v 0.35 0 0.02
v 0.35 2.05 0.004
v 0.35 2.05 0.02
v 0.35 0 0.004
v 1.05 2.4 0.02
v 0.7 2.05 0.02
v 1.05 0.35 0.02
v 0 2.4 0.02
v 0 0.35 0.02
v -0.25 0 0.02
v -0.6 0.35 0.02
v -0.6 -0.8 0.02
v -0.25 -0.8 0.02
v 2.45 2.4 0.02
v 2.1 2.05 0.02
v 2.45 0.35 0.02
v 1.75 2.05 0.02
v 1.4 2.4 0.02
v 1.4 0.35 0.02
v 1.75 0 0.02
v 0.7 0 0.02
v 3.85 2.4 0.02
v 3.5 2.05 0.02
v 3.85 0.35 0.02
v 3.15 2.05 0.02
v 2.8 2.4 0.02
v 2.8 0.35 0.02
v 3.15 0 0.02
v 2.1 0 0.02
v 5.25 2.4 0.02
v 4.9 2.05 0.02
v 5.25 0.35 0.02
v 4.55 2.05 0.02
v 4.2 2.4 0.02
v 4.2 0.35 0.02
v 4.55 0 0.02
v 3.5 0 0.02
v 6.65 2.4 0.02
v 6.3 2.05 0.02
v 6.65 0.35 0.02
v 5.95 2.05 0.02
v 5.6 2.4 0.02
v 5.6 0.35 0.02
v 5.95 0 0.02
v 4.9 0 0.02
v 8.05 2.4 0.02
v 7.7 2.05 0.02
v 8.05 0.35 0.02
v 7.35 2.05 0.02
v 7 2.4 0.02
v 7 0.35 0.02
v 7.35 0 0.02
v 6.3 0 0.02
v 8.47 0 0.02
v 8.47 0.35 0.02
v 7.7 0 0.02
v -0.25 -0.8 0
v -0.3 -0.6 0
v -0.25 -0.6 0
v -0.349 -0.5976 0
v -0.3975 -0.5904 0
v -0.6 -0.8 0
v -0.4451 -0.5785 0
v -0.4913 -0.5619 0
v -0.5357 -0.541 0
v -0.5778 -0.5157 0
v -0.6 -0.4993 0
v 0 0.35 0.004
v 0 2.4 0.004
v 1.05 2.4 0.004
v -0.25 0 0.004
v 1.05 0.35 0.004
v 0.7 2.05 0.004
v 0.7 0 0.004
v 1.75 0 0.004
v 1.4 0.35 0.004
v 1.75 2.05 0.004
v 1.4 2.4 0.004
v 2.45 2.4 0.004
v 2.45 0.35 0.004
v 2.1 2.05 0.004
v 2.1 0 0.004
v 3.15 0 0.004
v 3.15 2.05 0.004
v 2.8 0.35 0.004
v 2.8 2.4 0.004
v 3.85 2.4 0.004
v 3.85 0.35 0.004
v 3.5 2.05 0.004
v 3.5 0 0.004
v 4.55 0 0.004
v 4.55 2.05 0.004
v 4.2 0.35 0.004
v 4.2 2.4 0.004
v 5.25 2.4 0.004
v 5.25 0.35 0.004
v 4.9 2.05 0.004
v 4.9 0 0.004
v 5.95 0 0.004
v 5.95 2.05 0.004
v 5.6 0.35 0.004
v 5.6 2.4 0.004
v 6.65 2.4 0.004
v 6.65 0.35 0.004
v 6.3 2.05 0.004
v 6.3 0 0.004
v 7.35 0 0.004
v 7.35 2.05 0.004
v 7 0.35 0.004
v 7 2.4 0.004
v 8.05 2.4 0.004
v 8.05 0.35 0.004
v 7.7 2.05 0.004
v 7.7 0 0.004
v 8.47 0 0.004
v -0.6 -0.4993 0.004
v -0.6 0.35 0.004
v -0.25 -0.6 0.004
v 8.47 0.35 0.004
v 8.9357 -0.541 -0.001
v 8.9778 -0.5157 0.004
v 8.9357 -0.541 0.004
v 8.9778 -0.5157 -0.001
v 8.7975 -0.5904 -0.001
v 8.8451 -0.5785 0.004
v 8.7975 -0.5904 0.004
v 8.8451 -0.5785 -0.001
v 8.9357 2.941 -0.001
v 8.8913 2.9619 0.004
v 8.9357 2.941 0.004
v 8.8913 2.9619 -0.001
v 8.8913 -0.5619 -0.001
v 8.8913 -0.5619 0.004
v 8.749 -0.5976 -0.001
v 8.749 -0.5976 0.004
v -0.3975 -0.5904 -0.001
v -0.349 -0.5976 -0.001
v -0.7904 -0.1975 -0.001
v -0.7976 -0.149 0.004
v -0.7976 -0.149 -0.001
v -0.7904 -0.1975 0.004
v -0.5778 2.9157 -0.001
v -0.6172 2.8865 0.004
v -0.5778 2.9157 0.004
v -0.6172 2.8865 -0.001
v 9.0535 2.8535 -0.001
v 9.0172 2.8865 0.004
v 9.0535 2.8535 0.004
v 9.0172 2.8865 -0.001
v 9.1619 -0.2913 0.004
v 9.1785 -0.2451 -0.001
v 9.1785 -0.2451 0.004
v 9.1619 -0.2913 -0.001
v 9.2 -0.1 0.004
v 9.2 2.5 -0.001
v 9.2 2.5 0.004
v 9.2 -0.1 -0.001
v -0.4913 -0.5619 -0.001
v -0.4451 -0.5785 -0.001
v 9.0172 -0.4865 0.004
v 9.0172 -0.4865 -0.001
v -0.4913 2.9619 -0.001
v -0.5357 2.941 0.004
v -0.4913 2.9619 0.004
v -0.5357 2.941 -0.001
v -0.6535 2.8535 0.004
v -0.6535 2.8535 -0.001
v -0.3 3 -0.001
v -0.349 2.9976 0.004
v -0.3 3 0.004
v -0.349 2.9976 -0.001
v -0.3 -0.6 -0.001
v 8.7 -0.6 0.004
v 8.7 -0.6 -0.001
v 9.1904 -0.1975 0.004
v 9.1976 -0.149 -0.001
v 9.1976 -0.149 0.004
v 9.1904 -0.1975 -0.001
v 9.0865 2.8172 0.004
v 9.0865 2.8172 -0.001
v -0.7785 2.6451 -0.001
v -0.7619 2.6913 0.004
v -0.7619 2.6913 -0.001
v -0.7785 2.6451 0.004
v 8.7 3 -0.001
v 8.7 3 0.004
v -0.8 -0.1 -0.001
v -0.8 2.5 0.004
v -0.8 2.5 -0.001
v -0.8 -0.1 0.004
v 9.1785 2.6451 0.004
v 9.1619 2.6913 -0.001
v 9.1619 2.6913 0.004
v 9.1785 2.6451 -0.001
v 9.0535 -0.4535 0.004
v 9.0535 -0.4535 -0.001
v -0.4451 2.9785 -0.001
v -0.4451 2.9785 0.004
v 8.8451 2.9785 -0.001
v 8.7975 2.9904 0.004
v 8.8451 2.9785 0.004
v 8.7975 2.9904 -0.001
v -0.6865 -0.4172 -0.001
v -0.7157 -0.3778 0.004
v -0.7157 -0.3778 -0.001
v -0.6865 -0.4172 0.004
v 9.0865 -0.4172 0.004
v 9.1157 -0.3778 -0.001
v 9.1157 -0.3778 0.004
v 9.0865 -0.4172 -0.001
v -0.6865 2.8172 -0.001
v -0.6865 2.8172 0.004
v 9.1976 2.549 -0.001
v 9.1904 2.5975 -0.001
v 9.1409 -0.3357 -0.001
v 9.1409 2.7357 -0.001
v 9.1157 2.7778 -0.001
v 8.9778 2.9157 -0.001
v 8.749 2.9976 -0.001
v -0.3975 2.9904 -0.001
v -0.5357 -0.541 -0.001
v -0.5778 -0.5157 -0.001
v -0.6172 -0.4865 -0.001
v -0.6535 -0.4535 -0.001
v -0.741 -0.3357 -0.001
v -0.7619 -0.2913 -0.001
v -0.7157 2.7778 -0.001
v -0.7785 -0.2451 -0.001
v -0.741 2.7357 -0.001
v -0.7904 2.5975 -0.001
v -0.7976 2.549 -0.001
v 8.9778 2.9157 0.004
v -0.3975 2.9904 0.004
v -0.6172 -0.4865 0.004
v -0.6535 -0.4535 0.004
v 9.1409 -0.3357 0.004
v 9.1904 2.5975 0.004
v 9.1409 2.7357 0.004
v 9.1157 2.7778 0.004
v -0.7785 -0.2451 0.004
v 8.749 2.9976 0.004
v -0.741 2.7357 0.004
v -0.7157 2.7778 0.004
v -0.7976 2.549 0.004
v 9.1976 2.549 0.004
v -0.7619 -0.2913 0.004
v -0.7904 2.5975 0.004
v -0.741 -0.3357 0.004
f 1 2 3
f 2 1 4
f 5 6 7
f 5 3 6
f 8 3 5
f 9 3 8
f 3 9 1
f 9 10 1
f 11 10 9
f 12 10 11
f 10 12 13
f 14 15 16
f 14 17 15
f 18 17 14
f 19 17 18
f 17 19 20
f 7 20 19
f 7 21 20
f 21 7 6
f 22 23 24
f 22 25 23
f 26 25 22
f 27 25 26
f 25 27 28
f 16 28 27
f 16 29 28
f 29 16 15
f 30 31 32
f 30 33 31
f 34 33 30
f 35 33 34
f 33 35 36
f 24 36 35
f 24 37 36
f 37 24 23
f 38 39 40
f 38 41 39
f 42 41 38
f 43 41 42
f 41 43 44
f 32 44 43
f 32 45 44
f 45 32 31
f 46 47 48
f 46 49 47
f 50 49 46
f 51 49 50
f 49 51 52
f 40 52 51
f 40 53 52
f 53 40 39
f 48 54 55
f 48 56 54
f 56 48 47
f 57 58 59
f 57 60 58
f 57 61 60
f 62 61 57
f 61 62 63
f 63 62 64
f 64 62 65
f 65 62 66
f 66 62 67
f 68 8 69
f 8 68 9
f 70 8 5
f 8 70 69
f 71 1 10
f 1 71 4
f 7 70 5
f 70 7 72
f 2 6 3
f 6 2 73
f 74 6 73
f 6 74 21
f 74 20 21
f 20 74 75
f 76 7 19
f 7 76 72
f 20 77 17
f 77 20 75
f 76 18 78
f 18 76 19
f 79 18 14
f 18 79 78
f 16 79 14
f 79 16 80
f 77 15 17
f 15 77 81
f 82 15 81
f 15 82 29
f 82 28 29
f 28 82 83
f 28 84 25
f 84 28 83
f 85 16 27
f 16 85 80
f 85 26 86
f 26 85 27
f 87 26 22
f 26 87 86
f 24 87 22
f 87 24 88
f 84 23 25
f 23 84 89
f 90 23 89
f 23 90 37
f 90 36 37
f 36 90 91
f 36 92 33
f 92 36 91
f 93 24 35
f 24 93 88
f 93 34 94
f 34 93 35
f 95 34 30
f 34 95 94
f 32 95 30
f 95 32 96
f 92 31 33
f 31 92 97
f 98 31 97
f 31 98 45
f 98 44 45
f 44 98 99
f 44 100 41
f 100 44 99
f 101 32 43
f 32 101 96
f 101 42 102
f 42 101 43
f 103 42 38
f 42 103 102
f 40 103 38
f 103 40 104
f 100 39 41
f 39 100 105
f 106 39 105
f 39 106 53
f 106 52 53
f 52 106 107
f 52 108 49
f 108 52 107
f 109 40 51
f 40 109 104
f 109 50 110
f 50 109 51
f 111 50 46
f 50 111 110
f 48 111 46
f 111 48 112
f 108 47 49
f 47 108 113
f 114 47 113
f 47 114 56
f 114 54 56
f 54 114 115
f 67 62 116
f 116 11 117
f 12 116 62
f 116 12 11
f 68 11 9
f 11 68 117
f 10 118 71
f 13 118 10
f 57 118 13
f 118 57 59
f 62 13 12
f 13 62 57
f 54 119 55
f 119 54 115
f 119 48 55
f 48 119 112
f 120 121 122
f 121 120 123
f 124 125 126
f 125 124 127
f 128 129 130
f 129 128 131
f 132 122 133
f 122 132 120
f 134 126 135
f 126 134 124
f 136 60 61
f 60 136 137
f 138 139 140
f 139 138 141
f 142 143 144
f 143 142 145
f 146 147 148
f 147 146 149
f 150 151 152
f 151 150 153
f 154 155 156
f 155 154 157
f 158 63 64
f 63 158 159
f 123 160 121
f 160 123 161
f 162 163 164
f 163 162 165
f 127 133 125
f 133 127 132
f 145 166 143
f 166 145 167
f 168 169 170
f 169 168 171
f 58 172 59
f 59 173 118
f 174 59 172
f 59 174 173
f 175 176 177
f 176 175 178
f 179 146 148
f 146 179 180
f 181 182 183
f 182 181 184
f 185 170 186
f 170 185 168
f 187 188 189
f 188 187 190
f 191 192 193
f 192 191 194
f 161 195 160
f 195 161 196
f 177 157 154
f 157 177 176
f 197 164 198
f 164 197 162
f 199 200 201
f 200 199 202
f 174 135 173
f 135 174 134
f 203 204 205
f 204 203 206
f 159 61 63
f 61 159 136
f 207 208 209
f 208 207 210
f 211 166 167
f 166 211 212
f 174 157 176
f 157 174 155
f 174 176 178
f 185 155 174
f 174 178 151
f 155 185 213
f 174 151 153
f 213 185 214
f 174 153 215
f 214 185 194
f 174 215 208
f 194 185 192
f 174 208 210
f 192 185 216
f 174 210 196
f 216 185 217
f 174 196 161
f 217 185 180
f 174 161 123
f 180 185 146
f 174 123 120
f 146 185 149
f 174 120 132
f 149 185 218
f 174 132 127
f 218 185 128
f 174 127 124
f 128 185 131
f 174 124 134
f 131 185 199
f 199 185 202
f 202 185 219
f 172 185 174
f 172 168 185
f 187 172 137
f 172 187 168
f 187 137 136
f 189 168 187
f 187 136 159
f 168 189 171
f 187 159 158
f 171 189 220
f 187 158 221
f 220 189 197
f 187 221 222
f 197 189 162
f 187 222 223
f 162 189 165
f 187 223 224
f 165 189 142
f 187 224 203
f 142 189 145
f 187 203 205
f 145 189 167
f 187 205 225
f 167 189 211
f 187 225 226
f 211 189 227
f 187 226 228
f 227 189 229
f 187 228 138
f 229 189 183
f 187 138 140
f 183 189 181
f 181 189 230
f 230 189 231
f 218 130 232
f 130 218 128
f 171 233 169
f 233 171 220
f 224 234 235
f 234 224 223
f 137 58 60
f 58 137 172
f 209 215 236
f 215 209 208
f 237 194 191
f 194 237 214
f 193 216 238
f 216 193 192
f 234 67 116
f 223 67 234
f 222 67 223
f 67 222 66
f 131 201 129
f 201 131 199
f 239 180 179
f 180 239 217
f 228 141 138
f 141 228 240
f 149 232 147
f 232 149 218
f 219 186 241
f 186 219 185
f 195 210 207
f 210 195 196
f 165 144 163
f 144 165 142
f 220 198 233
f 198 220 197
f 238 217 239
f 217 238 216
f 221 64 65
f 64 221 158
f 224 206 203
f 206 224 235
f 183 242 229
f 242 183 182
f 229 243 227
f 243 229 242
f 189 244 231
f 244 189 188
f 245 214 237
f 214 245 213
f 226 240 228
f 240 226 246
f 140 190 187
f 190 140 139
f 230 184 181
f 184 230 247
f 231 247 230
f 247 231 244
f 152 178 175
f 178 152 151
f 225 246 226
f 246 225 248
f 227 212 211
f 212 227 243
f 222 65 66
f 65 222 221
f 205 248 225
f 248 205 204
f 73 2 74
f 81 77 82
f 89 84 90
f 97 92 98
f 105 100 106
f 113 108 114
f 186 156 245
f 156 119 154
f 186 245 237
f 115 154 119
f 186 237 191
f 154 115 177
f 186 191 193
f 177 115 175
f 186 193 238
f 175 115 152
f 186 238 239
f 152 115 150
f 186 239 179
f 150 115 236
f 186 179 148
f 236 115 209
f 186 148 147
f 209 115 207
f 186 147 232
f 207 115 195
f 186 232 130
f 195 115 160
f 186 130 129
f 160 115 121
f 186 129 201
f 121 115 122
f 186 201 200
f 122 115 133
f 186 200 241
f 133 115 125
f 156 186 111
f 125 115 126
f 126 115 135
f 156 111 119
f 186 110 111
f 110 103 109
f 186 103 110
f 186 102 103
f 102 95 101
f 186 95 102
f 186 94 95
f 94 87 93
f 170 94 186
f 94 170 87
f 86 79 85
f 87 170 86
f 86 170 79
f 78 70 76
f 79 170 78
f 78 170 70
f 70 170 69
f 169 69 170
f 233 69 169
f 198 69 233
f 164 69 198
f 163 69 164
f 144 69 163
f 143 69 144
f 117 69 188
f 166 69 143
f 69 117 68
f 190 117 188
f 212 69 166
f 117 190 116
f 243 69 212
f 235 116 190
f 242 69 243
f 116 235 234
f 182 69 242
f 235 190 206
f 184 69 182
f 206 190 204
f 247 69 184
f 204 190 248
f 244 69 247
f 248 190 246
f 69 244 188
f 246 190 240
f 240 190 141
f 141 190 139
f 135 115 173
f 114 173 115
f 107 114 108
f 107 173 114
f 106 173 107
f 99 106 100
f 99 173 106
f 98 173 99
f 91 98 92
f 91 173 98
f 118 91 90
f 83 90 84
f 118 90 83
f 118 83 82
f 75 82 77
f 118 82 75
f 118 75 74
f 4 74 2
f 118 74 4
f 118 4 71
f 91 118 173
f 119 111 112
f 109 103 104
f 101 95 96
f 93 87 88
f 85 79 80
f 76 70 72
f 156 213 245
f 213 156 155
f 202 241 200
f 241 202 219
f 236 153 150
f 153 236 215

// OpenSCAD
// file: ../Common/params.scad
// =========================================================================
// PencilAI - Common Parameters, Colors & Utility Library
// File: CAD Modelling/Common/params.scad
// =========================================================================

// --- Resolution Settings ---
$fn = 64;

// --- Physical Strip Dimensions (mm) ---
STRIP_LEN        = 54.0;   // Length of flexible tape (wraps ~1.9x on 9mm barrel)
STRIP_WID        = 20.0;   // Width of tape along the pen axis (grip zone height)
STRIP_CORNER_R   = 2.0;    // Rounded corner radius to prevent peeling

// --- Layer Heights & Z-Stackup (mm) ---
THICK_ADHESIVE   = 0.055;  // Skin-safe medical acrylic adhesive
THICK_KAPTON     = 0.025;  // Flexible Polyimide film substrate (25 um)
THICK_BASE       = THICK_ADHESIVE + THICK_KAPTON; // 0.080 mm base

THICK_COPPER     = 0.020;  // Etched copper traces (1/2 oz / 18-20 um)
THICK_GOLD       = 0.005;  // ENIG surface finish plating
THICK_CARBON     = 0.030;  // Screen-printed carbon resistive ink (30 um)
THICK_SPACER     = 0.015;  // Dielectric spacer dot height

THICK_TPU_SKIN   = 0.450;  // Translucent matte TPU outer protective grip film
THICK_TOTAL_MAX  = 0.530;  // Target total profile thickness: 0.53 mm

// --- Component Dimensions (mm) ---
// ST LIS2DH12 Ultra-low-power 3-axis accelerometer (WLCSP-12)
ACCEL_LEN        = 1.60;
ACCEL_WID        = 1.60;
ACCEL_H          = 0.40;   // Ultra-thin WLCSP package
ACCEL_BALL_PITCH = 0.40;   // 3x4 solder ball matrix
ACCEL_BALL_DIA   = 0.22;

// BLE Beacon SoC (InPlay IN100 / Nordic nRF52810 WLCSP)
BLE_LEN          = 2.20;
BLE_WID          = 2.20;
BLE_H            = 0.35;   // 0.35 mm profile
BLE_BALL_PITCH   = 0.45;   // 4x4 solder ball matrix
BLE_BALL_DIA     = 0.24;

// Ultra-Thin Printed Zinc-Manganese (Zn-Mn) Flexible Battery
BAT_LEN          = 16.5;   // Main pouch length
BAT_WID          = 12.6;   // Main pouch width
BAT_H            = 0.45;   // Printed paper battery thickness (0.45 mm)
BAT_SEAL_MARGIN  = 1.0;    // Perimeter foil crimp seal width
BAT_TAB_LEN      = 2.4;    // Terminal connector tab length
BAT_TAB_WID      = 1.2;    // Terminal tab width

// Interdigitated Carbon FSR Pinch Zone
FSR_LEN          = 17.5;
FSR_WID          = 13.6;
FSR_FINGERS      = 16;
FSR_BUS_WID      = 0.60;

// Serpentine 2.4 GHz Antenna
ANT_LOOPS        = 6;
ANT_STEP         = 1.40;
ANT_AMP          = 2.40;
ANT_TRACE_WID    = 0.35;

// Reference Pen
PEN_DIAMETER_DEFAULT = 9.0; // Standard ballpoint barrel (mm)

// --- Color Palette (RGBA) ---
C_KAPTON         = [0.85, 0.48, 0.08, 0.88]; // Translucent Amber Polyimide
C_ADHESIVE       = [0.95, 0.95, 0.92, 0.50]; // Clear skin-safe acrylic adhesive
C_RELEASE_LINER  = [0.98, 0.98, 0.96, 0.95]; // White silicone-coated pull tab
C_TPU_SKIN       = [0.18, 0.19, 0.22, 0.55]; // Translucent Charcoal Matte TPU
C_TPU_OPAQUE     = [0.14, 0.15, 0.17, 1.00]; // Grip ridges / tactile accents
C_COPPER         = [0.85, 0.45, 0.22, 1.00]; // Raw Etched Copper
C_GOLD           = [0.92, 0.74, 0.20, 1.00]; // ENIG Gold Plating
C_CARBON         = [0.12, 0.12, 0.13, 0.98]; // Screen-Printed Carbon Ink
C_DIELECTRIC     = [0.20, 0.65, 0.40, 0.75]; // Green/Teal Dielectric Spacer
C_SILICON        = [0.09, 0.10, 0.12, 1.00]; // WLCSP Mirror Silicon Die
C_SOLDER         = [0.76, 0.78, 0.82, 1.00]; // SAC305 Lead-Free Solder
C_CERAMIC        = [0.70, 0.58, 0.46, 1.00]; // 0201 MLCC Brown Ceramic
C_BATTERY_FOIL   = [0.80, 0.82, 0.85, 1.00]; // Hermetic Aluminum/Poly Pouch
C_BATTERY_SEAL   = [0.65, 0.67, 0.70, 1.00]; // Crimped Pouch Flange
C_BAT_ACCENT     = [0.15, 0.45, 0.75, 1.00]; // Insulator Layer / Branding
C_PEN_BARREL     = [0.93, 0.94, 0.96, 0.90]; // Smooth Polycarbonate Barrel
C_PEN_CHROME     = [0.84, 0.86, 0.89, 1.00]; // Mirror Chrome Trim
C_PEN_BRASS      = [0.86, 0.70, 0.28, 1.00]; // Machined Brass Tip Collar
C_PEN_BALL       = [0.35, 0.36, 0.38, 1.00]; // Tungsten Carbide Ball
C_PEN_INK        = [0.05, 0.10, 0.35, 1.00]; // Blue Ink Column inside refill

// --- Reusable Geometric Modules ---

// 2D Rounded Rectangle (Centered or Corner Origin)
module rounded_rect_2d(length, width, radius, center = false) {
    tx = center ? -length / 2 : 0;
    ty = center ? -width / 2 : 0;
    translate([tx, ty])
        offset(r = radius)
            offset(delta = -radius)
                square([length, width]);
}

// 3D Rounded Extruded Plate
module rounded_box(length, width, height, radius, center = false) {
    linear_extrude(height = height)
        rounded_rect_2d(length, width, radius, center = center);
}

// Spherical Solder Ball
module solder_ball(diameter) {
    color(C_SOLDER)
        sphere(d = diameter, $fn = 32);
}

// SMD 0201 / 01005 Passive Component (Capacitor / Inductor / Resistor)
module smd_passive_0201(len = 0.60, wid = 0.30, height = 0.30, body_color = C_CERAMIC) {
    term_len = 0.15;
    // Central Ceramic/Ferrite Body
    color(body_color)
        translate([term_len, 0, 0])
            cube([len - 2 * term_len, wid, height]);
    // Silver End Terminations
    color(C_SOLDER) {
        cube([term_len, wid, height]);
        translate([len - term_len, 0, 0])
            cube([term_len, wid, height]);
    }
}

// Circular Fiducial Alignment Marker (for high-precision flex assembly)
module fiducial_marker(diameter = 1.0, copper_h = THICK_COPPER) {
    color(C_GOLD)
        cylinder(d = diameter, h = copper_h, $fn = 32);
    color(C_KAPTON)
        difference() {
            cylinder(d = diameter * 2.2, h = copper_h + 0.001, $fn = 32);
            cylinder(d = diameter * 1.4, h = copper_h + 0.002, $fn = 32);
        }
}
// main file
// =========================================================================
// PencilAI - 2.4 GHz Printed Copper Meander Antenna
// File: CAD Modelling/Electronics/meander_antenna.scad
// =========================================================================

include <../Common/params.scad>

// --- View Controls (when rendered directly) ---
show_keepout_zone = true;   // Translucent boundary showing RF ground clearance keepout
show_ground_stub  = true;   // Ground connection stub for inverted-F matching
show_feedline     = true;   // 50-ohm microstrip feedline to BLE SoC

module meander_antenna(
    x = 0,
    y = 0,
    z = THICK_BASE,
    loops = ANT_LOOPS,
    step = ANT_STEP,
    amp = ANT_AMP,
    trace_w = ANT_TRACE_WID
) {
    translate([x, y, z]) {
        // 1. RF Ground Clearance Keepout Zone (Translucent Guide)
        if (show_keepout_zone) {
            color([0.2, 0.7, 0.9, 0.18])
                translate([-0.8, -0.6, -0.001])
                    rounded_box(loops * step + 1.6, amp + 1.2, 0.005, 0.5);
        }

        // 2. Copper Serpentine Resonator Traces
        color(C_COPPER) {
            for (i = [0 : loops - 1]) {
                // Vertical rising segment
                translate([i * step, 0, 0])
                    cube([trace_w, amp, THICK_COPPER]);

                // Top connecting horizontal segment
                translate([i * step, amp - trace_w, 0])
                    cube([step / 2 + trace_w, trace_w, THICK_COPPER]);

                // Vertical falling segment
                translate([i * step + step / 2, 0, 0])
                    cube([trace_w, amp, THICK_COPPER]);

                // Bottom connecting horizontal segment
                if (i < loops - 1) {
                    translate([i * step + step / 2, 0, 0])
                        cube([step / 2 + trace_w, trace_w, THICK_COPPER]);
                }
            }

            // Open-circuit capacitive end tip
            translate([(loops - 1) * step + step / 2, 0, 0])
                cube([trace_w * 2.2, trace_w, THICK_COPPER]);

            // 3. 50-Ohm Microstrip Feedline connecting to RF matching network
            if (show_feedline) {
                translate([0, 0, 0])
                    cube([trace_w, 0.6, THICK_COPPER]);
            }

            // 4. Ground Shunt Matching Stub
            if (show_ground_stub) {
                translate([-0.6, 0, 0])
                    cube([0.6, trace_w, THICK_COPPER]);
                translate([-0.6, -0.8, 0])
                    cube([trace_w, 0.8, THICK_COPPER]);
            }
        }
    }
}

// Standalone Render
meander_antenna(x = 0, y = 0, z = 0);
